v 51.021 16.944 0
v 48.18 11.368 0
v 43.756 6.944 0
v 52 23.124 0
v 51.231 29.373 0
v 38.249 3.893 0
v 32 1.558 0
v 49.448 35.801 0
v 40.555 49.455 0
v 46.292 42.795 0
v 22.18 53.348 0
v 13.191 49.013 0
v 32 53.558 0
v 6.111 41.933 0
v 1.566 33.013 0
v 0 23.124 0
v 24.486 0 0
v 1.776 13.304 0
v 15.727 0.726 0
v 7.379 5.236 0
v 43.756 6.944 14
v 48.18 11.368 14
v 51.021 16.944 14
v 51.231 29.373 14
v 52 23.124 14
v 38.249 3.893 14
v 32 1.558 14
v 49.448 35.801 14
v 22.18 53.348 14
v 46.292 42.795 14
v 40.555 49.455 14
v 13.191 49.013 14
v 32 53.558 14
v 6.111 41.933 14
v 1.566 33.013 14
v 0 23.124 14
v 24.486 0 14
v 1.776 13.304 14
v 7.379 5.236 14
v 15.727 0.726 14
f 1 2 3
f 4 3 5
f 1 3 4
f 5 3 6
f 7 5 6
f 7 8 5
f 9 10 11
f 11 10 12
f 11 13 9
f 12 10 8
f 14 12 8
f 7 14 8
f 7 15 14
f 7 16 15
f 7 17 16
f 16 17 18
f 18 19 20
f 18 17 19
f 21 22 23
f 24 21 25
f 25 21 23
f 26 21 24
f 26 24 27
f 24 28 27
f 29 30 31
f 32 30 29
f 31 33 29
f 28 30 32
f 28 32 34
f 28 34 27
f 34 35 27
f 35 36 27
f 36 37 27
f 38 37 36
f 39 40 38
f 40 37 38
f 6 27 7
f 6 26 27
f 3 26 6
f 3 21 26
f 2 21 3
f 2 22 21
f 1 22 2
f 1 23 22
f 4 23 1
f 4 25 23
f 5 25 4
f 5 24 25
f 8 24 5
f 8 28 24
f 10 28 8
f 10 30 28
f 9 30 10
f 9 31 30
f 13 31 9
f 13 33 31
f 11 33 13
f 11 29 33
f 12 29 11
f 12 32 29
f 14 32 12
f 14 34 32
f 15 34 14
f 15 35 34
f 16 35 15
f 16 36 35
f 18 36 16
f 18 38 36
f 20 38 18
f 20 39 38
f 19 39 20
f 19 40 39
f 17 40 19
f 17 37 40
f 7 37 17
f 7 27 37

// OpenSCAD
$fn = 32;

// ----------------------------------------------------------------------
// Cam disc: base radius 20.0 mm, lift 12.0 mm, 20 profile points
// ----------------------------------------------------------------------

// --- parameters (mm) ---
profile_height = 14;      // extrusion height
profile_points = 20;      // points of the closed outline

profile = [[52, 23.124], [51.231, 29.373], [49.448, 35.801], [46.292, 42.795], [40.555, 49.455], [32, 53.558], [22.18, 53.348], [13.191, 49.013], [6.111, 41.933], [1.566, 33.013], [0, 23.124], [1.776, 13.304], [7.379, 5.236], [15.727, 0.726], [24.486, 0], [32, 1.558], [38.249, 3.893], [43.756, 6.944], [48.18, 11.368], [51.021, 16.944]];  // single closed polygon, 20 points, counter clockwise

// --- the one profile operation ---
linear_extrude(height = profile_height) polygon(points = profile);
